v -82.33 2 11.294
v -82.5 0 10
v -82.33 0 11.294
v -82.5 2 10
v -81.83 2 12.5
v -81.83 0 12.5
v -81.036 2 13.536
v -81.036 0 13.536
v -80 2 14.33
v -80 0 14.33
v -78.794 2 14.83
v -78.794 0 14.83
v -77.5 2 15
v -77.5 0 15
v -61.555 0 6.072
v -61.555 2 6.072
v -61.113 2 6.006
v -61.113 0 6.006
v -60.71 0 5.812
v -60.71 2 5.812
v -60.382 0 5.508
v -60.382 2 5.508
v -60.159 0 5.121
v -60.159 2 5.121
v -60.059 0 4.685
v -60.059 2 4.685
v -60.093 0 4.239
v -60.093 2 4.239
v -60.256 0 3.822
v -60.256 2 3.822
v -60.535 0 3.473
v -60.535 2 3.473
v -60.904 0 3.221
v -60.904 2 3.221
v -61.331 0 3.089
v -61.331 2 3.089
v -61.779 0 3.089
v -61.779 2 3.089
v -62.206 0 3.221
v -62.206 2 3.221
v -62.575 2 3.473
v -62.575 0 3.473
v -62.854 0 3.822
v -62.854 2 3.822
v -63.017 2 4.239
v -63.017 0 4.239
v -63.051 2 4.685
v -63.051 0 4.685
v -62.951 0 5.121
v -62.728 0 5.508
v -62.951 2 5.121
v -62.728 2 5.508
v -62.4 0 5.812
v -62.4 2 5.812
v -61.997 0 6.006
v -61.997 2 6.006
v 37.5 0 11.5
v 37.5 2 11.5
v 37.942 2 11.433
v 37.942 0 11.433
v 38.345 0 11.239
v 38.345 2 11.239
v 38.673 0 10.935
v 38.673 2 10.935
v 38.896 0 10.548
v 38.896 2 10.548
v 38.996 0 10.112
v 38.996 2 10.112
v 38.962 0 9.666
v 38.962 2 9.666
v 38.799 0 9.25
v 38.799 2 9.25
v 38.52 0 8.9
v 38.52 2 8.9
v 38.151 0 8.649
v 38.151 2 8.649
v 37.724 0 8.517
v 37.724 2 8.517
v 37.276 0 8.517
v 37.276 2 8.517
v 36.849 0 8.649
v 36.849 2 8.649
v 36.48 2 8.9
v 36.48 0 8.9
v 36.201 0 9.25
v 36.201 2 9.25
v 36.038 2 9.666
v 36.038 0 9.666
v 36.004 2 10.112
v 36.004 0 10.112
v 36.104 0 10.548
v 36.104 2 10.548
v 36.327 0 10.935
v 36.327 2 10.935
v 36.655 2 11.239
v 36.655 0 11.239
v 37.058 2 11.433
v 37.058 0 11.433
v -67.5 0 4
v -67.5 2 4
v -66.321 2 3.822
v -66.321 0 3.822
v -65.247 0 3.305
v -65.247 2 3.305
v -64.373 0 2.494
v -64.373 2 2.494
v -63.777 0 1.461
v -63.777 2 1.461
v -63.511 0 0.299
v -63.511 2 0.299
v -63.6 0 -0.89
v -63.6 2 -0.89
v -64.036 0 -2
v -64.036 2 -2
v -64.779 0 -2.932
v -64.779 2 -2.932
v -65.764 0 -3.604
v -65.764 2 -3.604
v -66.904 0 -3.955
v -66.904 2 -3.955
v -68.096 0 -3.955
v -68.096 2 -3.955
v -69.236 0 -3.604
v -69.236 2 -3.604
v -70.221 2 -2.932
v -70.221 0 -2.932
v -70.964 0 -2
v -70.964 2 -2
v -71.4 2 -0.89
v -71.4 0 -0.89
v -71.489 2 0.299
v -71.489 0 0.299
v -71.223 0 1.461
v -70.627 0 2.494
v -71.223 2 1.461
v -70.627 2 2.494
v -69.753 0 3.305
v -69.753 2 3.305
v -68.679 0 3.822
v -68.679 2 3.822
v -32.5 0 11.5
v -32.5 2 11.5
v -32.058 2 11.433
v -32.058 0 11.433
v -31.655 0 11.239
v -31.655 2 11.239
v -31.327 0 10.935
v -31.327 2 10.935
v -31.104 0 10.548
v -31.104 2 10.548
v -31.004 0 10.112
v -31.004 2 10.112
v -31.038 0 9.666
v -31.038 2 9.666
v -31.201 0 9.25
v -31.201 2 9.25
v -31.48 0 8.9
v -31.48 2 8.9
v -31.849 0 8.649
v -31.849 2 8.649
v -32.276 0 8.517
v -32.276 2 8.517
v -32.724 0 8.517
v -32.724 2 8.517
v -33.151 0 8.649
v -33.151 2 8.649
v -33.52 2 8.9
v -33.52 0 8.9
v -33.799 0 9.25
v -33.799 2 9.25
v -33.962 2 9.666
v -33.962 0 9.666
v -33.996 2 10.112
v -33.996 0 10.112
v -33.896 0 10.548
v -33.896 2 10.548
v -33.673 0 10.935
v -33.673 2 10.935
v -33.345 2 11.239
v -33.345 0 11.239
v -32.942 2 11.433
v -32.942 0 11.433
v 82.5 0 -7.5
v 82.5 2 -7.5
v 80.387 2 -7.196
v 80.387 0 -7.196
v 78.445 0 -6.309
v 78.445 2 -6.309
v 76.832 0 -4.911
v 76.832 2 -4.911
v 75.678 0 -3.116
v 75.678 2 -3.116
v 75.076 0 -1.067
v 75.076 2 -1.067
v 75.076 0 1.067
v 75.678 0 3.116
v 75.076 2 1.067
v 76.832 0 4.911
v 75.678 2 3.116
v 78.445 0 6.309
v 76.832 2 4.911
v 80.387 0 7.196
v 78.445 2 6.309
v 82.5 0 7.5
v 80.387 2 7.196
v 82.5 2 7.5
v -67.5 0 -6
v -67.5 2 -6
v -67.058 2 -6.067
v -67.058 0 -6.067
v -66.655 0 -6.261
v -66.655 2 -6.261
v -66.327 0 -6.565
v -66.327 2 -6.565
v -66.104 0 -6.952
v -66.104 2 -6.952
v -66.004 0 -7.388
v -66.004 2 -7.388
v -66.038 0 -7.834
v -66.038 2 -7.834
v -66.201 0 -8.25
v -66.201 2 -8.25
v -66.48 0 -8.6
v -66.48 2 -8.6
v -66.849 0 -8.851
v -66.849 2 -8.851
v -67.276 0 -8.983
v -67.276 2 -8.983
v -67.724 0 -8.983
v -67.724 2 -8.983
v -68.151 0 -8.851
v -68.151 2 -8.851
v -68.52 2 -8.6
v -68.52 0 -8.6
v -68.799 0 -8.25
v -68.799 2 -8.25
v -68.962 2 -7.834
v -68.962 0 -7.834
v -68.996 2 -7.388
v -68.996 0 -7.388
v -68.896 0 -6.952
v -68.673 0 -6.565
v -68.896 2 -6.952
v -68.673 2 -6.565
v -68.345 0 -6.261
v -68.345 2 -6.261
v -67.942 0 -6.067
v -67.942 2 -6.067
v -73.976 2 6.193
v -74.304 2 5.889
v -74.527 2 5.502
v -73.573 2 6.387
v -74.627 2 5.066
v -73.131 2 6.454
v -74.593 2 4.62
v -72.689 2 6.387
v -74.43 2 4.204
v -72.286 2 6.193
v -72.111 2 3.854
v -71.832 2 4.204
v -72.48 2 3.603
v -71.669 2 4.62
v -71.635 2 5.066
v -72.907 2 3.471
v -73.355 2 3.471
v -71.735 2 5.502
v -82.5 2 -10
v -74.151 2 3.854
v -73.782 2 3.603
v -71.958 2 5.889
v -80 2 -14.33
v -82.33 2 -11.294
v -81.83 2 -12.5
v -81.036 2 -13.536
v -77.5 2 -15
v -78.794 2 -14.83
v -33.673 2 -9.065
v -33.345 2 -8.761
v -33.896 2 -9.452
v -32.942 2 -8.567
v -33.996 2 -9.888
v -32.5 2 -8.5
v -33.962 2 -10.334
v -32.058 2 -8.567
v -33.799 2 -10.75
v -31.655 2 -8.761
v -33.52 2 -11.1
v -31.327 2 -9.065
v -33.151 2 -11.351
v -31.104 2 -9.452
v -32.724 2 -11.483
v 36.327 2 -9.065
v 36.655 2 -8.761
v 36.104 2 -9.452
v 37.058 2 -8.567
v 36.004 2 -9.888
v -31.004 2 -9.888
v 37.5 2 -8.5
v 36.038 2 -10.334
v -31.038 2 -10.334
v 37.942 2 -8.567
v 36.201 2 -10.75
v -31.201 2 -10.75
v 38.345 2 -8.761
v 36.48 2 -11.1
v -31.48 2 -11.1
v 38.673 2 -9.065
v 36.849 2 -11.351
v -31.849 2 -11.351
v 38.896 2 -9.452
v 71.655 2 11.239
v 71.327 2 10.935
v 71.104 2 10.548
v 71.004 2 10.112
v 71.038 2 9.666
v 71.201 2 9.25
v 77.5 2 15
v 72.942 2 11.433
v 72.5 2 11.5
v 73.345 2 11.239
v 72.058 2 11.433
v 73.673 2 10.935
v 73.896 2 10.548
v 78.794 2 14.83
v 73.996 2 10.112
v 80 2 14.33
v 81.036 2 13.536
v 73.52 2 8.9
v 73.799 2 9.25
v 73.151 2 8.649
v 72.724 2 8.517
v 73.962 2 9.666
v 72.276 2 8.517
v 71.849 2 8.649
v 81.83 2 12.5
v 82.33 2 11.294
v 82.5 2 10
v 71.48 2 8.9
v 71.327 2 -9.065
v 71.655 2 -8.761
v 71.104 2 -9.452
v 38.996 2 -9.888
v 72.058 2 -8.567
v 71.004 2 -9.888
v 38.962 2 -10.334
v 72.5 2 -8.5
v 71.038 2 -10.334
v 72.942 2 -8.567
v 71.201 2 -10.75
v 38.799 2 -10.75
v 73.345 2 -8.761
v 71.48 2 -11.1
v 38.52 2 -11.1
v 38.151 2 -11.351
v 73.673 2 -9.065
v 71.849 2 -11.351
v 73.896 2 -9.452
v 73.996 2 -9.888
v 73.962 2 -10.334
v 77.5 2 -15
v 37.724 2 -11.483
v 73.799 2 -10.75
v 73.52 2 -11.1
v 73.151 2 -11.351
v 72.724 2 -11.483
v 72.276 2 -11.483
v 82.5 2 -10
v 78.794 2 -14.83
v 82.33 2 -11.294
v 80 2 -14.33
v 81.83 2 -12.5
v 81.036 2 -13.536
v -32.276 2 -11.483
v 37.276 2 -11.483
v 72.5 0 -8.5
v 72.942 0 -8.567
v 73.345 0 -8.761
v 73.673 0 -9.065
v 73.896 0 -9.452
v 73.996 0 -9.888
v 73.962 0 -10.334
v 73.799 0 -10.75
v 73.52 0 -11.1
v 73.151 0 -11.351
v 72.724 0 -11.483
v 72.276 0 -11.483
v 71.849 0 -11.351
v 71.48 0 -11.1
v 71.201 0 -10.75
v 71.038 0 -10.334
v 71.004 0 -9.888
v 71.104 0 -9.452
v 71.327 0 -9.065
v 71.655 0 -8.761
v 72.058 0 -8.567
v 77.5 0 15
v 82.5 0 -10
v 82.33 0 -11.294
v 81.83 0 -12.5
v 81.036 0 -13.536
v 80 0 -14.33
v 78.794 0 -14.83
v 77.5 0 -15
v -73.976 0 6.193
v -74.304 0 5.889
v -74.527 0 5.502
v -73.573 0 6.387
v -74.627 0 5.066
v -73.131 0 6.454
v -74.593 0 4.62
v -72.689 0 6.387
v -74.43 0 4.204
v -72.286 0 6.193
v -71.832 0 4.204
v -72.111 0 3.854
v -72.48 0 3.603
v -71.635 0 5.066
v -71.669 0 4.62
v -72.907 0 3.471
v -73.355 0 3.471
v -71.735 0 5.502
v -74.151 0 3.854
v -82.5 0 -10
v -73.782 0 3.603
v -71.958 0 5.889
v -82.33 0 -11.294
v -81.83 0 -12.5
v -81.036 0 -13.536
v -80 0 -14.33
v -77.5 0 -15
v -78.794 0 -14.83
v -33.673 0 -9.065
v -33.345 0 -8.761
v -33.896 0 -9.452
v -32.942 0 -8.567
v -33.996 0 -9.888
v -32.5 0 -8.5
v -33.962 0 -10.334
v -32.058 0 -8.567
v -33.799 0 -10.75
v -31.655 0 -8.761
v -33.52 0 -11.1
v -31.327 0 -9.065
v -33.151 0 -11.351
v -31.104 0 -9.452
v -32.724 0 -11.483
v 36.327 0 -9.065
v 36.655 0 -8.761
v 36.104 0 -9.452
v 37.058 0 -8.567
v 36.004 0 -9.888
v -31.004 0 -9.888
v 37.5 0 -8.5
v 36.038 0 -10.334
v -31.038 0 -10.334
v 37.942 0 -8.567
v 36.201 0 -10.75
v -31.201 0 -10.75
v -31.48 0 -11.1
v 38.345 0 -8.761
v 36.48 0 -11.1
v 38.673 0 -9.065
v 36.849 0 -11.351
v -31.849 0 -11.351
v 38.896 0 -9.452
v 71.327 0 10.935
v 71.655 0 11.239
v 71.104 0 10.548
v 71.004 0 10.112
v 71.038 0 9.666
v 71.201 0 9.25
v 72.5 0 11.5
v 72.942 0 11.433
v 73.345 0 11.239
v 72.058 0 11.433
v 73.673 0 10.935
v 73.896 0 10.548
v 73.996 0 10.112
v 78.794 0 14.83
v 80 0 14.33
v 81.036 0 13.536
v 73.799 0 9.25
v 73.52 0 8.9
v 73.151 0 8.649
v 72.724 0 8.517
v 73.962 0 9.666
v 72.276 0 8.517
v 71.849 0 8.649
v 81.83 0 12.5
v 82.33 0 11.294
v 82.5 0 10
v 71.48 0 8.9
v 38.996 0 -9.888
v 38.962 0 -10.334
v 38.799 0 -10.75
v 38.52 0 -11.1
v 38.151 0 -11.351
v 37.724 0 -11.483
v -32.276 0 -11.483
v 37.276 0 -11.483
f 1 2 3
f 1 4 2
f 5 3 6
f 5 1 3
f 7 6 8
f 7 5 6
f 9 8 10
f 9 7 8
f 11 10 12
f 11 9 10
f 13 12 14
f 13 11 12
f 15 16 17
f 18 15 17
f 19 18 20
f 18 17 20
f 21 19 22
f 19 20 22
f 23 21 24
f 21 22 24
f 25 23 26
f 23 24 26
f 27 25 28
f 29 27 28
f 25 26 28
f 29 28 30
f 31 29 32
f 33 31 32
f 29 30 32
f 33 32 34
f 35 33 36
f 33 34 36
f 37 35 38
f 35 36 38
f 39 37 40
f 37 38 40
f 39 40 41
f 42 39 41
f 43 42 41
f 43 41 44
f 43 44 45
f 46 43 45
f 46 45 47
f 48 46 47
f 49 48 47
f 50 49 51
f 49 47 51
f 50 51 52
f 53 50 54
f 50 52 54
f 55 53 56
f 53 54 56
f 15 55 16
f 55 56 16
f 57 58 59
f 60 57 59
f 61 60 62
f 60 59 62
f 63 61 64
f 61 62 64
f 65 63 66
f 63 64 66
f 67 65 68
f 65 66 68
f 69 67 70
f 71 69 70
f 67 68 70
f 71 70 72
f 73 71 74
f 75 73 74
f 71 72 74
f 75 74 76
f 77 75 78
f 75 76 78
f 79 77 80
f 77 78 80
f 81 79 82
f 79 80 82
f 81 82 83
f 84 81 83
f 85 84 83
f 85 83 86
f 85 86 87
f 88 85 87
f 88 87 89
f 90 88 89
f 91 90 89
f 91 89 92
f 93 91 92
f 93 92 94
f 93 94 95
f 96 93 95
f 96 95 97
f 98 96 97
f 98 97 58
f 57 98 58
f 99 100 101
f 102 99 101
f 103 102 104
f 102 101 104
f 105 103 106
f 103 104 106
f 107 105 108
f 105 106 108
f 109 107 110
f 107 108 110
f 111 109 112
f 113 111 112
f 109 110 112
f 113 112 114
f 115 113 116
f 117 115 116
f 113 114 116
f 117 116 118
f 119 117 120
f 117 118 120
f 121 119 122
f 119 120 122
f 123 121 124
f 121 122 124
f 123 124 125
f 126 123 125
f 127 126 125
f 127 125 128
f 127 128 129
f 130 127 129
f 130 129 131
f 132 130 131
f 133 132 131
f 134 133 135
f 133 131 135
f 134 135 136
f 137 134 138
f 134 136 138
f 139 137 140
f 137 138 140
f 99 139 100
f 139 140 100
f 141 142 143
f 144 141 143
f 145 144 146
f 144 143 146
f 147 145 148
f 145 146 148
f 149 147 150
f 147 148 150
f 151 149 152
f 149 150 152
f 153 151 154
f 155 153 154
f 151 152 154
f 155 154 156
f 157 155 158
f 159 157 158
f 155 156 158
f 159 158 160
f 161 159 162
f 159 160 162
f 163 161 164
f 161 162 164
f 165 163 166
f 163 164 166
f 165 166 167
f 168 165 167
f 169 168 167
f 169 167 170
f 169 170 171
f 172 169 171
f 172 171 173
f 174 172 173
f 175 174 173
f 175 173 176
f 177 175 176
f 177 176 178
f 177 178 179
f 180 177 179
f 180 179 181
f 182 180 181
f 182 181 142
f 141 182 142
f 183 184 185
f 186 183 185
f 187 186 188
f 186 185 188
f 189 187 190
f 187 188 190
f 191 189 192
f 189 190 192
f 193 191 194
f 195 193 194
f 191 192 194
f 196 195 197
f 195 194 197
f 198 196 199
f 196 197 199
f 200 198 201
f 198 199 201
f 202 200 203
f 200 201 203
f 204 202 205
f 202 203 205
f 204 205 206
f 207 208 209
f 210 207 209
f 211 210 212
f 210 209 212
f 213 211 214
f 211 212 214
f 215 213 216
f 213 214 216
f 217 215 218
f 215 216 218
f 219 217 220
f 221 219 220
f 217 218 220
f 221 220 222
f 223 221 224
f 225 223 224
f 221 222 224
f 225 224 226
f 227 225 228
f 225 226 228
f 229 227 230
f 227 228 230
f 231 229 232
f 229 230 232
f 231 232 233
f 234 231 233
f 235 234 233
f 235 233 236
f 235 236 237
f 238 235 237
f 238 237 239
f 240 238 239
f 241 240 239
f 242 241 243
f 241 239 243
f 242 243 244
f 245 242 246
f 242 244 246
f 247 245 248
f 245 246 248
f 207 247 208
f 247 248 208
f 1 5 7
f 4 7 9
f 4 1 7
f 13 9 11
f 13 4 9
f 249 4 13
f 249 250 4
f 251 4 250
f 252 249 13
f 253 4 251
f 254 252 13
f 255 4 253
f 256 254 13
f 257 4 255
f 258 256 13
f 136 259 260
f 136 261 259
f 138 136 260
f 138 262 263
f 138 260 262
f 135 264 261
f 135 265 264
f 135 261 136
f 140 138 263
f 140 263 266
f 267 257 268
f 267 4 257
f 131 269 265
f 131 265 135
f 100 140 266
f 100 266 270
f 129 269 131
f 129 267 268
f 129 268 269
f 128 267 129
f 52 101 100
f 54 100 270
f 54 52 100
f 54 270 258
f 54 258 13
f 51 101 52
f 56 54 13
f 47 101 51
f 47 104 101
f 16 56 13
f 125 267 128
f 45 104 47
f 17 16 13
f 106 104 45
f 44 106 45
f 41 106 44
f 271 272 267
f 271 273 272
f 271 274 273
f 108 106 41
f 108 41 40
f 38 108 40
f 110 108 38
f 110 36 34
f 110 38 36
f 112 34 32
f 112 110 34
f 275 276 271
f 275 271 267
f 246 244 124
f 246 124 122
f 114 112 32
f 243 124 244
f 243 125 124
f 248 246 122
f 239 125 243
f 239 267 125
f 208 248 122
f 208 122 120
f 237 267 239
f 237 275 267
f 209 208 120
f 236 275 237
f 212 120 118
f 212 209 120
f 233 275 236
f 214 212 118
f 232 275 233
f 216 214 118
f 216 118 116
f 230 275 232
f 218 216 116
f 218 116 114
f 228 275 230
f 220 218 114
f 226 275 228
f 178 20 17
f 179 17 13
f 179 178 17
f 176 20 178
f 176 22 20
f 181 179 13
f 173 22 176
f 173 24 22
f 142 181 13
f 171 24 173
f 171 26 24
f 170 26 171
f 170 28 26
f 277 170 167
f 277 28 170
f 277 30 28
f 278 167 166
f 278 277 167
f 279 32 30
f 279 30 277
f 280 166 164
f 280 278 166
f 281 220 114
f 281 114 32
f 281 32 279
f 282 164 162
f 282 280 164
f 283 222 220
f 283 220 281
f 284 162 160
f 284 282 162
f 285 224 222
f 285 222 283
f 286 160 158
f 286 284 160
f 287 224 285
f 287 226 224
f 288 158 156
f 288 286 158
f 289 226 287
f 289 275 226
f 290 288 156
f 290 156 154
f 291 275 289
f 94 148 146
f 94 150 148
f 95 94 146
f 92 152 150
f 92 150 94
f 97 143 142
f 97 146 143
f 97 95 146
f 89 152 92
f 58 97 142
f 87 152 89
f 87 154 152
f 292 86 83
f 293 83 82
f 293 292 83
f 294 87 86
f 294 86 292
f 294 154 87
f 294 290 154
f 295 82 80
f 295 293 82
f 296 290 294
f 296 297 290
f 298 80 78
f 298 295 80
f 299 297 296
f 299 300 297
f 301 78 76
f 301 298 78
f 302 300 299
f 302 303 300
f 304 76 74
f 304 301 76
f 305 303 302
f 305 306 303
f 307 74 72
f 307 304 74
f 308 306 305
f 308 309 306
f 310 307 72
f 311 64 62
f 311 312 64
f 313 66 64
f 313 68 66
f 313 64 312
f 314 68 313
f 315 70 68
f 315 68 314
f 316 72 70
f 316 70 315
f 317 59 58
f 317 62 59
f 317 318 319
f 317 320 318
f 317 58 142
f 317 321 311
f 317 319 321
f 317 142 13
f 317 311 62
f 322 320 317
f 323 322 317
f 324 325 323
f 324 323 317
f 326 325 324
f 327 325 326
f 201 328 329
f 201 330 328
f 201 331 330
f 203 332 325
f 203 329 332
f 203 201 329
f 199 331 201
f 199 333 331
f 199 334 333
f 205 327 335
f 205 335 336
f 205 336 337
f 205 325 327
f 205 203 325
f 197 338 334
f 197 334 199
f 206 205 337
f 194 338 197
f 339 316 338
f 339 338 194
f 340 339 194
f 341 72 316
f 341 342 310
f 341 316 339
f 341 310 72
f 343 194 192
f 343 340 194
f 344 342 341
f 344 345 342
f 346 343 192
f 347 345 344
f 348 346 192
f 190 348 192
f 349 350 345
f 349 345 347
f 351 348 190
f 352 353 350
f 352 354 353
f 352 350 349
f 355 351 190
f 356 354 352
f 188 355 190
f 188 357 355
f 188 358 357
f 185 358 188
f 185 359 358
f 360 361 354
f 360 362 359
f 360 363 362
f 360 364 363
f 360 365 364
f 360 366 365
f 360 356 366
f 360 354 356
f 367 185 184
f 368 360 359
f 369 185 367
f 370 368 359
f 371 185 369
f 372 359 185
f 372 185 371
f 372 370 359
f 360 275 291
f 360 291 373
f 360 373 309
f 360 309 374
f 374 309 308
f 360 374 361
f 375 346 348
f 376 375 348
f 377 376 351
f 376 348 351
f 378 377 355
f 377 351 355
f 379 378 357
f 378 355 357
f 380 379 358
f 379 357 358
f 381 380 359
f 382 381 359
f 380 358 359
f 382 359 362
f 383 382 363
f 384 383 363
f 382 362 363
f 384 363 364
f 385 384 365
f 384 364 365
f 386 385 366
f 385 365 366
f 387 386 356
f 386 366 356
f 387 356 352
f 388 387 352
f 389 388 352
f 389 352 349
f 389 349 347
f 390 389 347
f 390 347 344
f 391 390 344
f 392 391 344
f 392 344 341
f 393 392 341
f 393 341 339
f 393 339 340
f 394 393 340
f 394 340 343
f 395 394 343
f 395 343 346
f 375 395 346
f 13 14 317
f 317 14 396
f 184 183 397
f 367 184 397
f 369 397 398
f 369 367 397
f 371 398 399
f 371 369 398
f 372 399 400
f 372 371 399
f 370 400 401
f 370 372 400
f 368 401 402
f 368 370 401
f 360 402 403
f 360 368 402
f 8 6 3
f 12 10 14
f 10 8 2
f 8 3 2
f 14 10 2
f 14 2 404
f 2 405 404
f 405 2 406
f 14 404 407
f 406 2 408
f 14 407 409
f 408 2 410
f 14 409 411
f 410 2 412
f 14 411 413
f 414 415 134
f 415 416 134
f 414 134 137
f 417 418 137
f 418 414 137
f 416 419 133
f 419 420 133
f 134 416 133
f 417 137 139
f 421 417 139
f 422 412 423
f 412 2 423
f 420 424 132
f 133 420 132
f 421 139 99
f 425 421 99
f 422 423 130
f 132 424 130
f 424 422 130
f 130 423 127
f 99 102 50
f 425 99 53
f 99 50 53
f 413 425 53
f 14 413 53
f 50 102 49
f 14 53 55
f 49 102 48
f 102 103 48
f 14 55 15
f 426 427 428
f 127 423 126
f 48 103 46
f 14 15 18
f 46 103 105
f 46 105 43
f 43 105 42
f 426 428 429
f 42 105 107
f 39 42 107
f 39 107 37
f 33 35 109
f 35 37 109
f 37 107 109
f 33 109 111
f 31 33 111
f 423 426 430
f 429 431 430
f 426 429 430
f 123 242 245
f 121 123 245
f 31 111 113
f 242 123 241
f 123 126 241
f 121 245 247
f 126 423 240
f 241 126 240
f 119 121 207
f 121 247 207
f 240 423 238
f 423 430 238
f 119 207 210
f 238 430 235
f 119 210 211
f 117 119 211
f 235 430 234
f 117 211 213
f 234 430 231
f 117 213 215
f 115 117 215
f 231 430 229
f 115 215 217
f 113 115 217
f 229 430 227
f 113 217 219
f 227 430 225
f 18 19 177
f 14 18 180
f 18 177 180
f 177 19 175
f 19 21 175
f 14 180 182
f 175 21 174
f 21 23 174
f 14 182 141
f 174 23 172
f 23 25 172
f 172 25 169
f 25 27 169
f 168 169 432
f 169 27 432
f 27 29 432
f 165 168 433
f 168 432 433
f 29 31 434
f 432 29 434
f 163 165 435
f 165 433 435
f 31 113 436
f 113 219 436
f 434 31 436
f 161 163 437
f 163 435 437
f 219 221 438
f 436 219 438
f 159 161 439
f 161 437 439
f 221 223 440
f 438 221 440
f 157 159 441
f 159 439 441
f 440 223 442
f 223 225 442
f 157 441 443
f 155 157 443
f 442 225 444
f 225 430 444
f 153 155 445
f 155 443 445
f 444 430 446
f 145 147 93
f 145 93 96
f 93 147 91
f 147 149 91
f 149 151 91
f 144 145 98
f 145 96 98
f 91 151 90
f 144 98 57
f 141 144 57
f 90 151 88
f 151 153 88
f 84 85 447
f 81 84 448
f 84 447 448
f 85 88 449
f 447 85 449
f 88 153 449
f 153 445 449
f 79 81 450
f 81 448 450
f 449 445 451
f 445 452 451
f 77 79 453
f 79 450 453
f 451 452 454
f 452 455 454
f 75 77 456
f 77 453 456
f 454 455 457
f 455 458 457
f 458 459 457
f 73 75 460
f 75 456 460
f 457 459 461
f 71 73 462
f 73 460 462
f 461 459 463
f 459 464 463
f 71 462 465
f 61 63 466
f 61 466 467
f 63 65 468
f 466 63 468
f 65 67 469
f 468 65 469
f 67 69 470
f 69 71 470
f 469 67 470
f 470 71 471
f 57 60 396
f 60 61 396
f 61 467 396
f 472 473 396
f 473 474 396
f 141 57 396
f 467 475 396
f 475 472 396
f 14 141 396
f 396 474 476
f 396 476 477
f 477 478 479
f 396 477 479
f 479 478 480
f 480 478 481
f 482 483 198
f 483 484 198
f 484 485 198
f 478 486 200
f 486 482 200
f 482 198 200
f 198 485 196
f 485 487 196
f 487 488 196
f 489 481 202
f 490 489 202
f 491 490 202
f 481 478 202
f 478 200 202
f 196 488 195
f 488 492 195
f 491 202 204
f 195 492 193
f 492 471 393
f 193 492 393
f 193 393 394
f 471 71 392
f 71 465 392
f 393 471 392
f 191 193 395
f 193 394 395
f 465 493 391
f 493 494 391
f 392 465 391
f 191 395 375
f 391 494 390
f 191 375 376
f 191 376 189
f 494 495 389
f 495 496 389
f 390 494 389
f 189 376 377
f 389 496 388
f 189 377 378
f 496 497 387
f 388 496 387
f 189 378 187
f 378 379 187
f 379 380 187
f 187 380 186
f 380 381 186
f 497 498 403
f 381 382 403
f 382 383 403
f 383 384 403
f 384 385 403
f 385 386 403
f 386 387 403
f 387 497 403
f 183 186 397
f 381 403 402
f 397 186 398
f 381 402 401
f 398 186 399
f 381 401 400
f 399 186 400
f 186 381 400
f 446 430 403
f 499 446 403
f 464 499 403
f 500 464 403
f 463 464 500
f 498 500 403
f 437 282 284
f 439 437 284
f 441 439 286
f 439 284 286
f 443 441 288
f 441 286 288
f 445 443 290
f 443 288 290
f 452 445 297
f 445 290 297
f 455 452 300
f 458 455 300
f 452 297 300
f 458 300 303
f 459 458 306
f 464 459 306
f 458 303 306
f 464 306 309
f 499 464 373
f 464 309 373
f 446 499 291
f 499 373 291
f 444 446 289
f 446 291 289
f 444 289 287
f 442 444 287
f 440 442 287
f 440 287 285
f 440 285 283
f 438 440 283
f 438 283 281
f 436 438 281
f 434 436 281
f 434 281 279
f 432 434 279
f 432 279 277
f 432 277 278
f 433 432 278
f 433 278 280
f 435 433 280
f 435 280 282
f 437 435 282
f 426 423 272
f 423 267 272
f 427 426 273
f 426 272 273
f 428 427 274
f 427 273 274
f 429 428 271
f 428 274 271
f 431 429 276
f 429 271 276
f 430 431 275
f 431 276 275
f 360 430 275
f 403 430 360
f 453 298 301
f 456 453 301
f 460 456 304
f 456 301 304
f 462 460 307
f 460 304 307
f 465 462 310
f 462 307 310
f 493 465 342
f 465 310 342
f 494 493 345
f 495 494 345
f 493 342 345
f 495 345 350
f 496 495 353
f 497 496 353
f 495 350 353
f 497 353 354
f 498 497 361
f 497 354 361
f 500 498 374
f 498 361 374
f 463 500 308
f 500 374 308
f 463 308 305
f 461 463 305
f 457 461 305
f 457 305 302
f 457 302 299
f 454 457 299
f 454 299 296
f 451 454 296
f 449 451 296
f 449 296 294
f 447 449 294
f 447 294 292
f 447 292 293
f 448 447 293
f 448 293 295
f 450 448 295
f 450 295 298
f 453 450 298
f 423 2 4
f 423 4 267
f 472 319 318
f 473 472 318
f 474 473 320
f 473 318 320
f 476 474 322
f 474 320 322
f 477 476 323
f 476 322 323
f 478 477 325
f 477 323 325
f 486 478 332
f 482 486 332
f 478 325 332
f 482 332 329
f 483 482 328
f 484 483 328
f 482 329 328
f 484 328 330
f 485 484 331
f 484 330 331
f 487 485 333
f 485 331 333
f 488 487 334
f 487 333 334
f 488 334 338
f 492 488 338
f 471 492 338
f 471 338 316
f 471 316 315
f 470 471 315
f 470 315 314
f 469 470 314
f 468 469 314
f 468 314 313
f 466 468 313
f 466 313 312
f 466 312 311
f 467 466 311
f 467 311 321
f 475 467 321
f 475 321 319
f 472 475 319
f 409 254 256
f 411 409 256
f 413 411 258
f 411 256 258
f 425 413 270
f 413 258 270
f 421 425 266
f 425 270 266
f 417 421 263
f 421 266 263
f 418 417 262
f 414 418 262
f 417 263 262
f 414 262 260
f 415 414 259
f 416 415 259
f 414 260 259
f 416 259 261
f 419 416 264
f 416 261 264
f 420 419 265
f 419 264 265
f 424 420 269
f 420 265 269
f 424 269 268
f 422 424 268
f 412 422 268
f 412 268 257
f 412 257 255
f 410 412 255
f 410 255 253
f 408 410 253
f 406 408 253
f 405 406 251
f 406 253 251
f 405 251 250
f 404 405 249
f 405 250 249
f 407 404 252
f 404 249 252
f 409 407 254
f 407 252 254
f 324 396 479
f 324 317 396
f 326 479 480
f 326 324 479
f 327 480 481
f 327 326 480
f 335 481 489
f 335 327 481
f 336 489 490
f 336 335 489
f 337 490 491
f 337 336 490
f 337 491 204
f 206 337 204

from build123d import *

# Parameters (mm, degrees)
SKETCH1_W           = 165
SKETCH1_H           = 30
BOSS_EXTRUDE1_DEPTH = 2
FILLET1_R           = 5
SKETCH3_R           = 4
SKETCH3_R_2         = 1.5
CUT_EXTRUDE1_DEPTH  = 2
SKETCH4_R           = 7.5
CUT_EXTRUDE2_DEPTH  = 10
SKETCH5_R           = 1.5
CUT_EXTRUDE3_DEPTH  = 10
SKETCH6_R           = 1.5
CUT_EXTRUDE4_DEPTH  = 84.876397157


with BuildPart() as part:
    # Sketch1 → Boss-Extrude1 (new body)
    with BuildSketch(Plane(origin=(0, 0, 0), x_dir=(1, 0, 0), z_dir=(0, 1, 0))):
        Rectangle(SKETCH1_W, SKETCH1_H)
    extrude(amount=BOSS_EXTRUDE1_DEPTH)

    # Fillet1
    fillet1_edges = [part.edges().sort_by_distance(p)[0] for p in [
        (82.5, 1, 15),
        (-82.5, 1, 15),
        (-82.5, 1, -15),
        (82.5, 1, -15),
    ]]
    fillet(fillet1_edges, radius=FILLET1_R)

    # Sketch3 → Cut-Extrude1 (cut)
    with BuildSketch(Plane(origin=(0, 2, 0), x_dir=(1, 0, 0), z_dir=(0, 1, 0))):
        with Locations(Location((-67.5, 0, 0), (0, 0, 270))):
            Circle(SKETCH3_R)
        with Locations(Location((-67.5, 7.5, 0), (0, 0, 270))):
            Circle(SKETCH3_R_2)
        with Locations(Location((-61.555061089, -4.572493996, 0), (0, 0, 270))):
            Circle(SKETCH3_R_2)
        with Locations(Location((-73.130988244, -4.953985406, 0), (0, 0, 270))):
            Circle(SKETCH3_R_2)
    extrude(amount=-CUT_EXTRUDE1_DEPTH, mode=Mode.SUBTRACT)

    # Sketch4 → Cut-Extrude2 (cut)
    with BuildSketch(Plane(origin=(0, 2, 0), x_dir=(1, 0, 0), z_dir=(0, 1, 0))):
        with Locations((82.5, 0)):
            Circle(SKETCH4_R)
    extrude(amount=-CUT_EXTRUDE2_DEPTH, mode=Mode.SUBTRACT)

    # Sketch5 → Cut-Extrude3 (cut)
    with BuildSketch(Plane(origin=(0, 2, 0), x_dir=(1, 0, 0), z_dir=(0, 1, 0))):
        with Locations(Location((-32.5, 10, 0), (0, 0, 270))):
            Circle(SKETCH5_R)
        with Locations(Location((37.5, 10, 0), (0, 0, 270))):
            Circle(SKETCH5_R)
        with Locations(Location((-32.5, -10, 0), (0, 0, 270))):
            Circle(SKETCH5_R)
        with Locations(Location((37.5, -10, 0), (0, 0, 270))):
            Circle(SKETCH5_R)
    extrude(amount=-CUT_EXTRUDE3_DEPTH, mode=Mode.SUBTRACT)

    # Sketch6 → Cut-Extrude4 (cut, through all)
    with BuildSketch(Plane(origin=(0, 2, 0), x_dir=(1, 0, 0), z_dir=(0, 1, 0))):
        with Locations(Location((72.5, 10, 0), (0, 0, 270))):
            Circle(SKETCH6_R)
        with Locations(Location((72.5, -10, 0), (0, 0, 270))):
            Circle(SKETCH6_R)
    extrude(amount=-CUT_EXTRUDE4_DEPTH, mode=Mode.SUBTRACT)


solid = part.part
